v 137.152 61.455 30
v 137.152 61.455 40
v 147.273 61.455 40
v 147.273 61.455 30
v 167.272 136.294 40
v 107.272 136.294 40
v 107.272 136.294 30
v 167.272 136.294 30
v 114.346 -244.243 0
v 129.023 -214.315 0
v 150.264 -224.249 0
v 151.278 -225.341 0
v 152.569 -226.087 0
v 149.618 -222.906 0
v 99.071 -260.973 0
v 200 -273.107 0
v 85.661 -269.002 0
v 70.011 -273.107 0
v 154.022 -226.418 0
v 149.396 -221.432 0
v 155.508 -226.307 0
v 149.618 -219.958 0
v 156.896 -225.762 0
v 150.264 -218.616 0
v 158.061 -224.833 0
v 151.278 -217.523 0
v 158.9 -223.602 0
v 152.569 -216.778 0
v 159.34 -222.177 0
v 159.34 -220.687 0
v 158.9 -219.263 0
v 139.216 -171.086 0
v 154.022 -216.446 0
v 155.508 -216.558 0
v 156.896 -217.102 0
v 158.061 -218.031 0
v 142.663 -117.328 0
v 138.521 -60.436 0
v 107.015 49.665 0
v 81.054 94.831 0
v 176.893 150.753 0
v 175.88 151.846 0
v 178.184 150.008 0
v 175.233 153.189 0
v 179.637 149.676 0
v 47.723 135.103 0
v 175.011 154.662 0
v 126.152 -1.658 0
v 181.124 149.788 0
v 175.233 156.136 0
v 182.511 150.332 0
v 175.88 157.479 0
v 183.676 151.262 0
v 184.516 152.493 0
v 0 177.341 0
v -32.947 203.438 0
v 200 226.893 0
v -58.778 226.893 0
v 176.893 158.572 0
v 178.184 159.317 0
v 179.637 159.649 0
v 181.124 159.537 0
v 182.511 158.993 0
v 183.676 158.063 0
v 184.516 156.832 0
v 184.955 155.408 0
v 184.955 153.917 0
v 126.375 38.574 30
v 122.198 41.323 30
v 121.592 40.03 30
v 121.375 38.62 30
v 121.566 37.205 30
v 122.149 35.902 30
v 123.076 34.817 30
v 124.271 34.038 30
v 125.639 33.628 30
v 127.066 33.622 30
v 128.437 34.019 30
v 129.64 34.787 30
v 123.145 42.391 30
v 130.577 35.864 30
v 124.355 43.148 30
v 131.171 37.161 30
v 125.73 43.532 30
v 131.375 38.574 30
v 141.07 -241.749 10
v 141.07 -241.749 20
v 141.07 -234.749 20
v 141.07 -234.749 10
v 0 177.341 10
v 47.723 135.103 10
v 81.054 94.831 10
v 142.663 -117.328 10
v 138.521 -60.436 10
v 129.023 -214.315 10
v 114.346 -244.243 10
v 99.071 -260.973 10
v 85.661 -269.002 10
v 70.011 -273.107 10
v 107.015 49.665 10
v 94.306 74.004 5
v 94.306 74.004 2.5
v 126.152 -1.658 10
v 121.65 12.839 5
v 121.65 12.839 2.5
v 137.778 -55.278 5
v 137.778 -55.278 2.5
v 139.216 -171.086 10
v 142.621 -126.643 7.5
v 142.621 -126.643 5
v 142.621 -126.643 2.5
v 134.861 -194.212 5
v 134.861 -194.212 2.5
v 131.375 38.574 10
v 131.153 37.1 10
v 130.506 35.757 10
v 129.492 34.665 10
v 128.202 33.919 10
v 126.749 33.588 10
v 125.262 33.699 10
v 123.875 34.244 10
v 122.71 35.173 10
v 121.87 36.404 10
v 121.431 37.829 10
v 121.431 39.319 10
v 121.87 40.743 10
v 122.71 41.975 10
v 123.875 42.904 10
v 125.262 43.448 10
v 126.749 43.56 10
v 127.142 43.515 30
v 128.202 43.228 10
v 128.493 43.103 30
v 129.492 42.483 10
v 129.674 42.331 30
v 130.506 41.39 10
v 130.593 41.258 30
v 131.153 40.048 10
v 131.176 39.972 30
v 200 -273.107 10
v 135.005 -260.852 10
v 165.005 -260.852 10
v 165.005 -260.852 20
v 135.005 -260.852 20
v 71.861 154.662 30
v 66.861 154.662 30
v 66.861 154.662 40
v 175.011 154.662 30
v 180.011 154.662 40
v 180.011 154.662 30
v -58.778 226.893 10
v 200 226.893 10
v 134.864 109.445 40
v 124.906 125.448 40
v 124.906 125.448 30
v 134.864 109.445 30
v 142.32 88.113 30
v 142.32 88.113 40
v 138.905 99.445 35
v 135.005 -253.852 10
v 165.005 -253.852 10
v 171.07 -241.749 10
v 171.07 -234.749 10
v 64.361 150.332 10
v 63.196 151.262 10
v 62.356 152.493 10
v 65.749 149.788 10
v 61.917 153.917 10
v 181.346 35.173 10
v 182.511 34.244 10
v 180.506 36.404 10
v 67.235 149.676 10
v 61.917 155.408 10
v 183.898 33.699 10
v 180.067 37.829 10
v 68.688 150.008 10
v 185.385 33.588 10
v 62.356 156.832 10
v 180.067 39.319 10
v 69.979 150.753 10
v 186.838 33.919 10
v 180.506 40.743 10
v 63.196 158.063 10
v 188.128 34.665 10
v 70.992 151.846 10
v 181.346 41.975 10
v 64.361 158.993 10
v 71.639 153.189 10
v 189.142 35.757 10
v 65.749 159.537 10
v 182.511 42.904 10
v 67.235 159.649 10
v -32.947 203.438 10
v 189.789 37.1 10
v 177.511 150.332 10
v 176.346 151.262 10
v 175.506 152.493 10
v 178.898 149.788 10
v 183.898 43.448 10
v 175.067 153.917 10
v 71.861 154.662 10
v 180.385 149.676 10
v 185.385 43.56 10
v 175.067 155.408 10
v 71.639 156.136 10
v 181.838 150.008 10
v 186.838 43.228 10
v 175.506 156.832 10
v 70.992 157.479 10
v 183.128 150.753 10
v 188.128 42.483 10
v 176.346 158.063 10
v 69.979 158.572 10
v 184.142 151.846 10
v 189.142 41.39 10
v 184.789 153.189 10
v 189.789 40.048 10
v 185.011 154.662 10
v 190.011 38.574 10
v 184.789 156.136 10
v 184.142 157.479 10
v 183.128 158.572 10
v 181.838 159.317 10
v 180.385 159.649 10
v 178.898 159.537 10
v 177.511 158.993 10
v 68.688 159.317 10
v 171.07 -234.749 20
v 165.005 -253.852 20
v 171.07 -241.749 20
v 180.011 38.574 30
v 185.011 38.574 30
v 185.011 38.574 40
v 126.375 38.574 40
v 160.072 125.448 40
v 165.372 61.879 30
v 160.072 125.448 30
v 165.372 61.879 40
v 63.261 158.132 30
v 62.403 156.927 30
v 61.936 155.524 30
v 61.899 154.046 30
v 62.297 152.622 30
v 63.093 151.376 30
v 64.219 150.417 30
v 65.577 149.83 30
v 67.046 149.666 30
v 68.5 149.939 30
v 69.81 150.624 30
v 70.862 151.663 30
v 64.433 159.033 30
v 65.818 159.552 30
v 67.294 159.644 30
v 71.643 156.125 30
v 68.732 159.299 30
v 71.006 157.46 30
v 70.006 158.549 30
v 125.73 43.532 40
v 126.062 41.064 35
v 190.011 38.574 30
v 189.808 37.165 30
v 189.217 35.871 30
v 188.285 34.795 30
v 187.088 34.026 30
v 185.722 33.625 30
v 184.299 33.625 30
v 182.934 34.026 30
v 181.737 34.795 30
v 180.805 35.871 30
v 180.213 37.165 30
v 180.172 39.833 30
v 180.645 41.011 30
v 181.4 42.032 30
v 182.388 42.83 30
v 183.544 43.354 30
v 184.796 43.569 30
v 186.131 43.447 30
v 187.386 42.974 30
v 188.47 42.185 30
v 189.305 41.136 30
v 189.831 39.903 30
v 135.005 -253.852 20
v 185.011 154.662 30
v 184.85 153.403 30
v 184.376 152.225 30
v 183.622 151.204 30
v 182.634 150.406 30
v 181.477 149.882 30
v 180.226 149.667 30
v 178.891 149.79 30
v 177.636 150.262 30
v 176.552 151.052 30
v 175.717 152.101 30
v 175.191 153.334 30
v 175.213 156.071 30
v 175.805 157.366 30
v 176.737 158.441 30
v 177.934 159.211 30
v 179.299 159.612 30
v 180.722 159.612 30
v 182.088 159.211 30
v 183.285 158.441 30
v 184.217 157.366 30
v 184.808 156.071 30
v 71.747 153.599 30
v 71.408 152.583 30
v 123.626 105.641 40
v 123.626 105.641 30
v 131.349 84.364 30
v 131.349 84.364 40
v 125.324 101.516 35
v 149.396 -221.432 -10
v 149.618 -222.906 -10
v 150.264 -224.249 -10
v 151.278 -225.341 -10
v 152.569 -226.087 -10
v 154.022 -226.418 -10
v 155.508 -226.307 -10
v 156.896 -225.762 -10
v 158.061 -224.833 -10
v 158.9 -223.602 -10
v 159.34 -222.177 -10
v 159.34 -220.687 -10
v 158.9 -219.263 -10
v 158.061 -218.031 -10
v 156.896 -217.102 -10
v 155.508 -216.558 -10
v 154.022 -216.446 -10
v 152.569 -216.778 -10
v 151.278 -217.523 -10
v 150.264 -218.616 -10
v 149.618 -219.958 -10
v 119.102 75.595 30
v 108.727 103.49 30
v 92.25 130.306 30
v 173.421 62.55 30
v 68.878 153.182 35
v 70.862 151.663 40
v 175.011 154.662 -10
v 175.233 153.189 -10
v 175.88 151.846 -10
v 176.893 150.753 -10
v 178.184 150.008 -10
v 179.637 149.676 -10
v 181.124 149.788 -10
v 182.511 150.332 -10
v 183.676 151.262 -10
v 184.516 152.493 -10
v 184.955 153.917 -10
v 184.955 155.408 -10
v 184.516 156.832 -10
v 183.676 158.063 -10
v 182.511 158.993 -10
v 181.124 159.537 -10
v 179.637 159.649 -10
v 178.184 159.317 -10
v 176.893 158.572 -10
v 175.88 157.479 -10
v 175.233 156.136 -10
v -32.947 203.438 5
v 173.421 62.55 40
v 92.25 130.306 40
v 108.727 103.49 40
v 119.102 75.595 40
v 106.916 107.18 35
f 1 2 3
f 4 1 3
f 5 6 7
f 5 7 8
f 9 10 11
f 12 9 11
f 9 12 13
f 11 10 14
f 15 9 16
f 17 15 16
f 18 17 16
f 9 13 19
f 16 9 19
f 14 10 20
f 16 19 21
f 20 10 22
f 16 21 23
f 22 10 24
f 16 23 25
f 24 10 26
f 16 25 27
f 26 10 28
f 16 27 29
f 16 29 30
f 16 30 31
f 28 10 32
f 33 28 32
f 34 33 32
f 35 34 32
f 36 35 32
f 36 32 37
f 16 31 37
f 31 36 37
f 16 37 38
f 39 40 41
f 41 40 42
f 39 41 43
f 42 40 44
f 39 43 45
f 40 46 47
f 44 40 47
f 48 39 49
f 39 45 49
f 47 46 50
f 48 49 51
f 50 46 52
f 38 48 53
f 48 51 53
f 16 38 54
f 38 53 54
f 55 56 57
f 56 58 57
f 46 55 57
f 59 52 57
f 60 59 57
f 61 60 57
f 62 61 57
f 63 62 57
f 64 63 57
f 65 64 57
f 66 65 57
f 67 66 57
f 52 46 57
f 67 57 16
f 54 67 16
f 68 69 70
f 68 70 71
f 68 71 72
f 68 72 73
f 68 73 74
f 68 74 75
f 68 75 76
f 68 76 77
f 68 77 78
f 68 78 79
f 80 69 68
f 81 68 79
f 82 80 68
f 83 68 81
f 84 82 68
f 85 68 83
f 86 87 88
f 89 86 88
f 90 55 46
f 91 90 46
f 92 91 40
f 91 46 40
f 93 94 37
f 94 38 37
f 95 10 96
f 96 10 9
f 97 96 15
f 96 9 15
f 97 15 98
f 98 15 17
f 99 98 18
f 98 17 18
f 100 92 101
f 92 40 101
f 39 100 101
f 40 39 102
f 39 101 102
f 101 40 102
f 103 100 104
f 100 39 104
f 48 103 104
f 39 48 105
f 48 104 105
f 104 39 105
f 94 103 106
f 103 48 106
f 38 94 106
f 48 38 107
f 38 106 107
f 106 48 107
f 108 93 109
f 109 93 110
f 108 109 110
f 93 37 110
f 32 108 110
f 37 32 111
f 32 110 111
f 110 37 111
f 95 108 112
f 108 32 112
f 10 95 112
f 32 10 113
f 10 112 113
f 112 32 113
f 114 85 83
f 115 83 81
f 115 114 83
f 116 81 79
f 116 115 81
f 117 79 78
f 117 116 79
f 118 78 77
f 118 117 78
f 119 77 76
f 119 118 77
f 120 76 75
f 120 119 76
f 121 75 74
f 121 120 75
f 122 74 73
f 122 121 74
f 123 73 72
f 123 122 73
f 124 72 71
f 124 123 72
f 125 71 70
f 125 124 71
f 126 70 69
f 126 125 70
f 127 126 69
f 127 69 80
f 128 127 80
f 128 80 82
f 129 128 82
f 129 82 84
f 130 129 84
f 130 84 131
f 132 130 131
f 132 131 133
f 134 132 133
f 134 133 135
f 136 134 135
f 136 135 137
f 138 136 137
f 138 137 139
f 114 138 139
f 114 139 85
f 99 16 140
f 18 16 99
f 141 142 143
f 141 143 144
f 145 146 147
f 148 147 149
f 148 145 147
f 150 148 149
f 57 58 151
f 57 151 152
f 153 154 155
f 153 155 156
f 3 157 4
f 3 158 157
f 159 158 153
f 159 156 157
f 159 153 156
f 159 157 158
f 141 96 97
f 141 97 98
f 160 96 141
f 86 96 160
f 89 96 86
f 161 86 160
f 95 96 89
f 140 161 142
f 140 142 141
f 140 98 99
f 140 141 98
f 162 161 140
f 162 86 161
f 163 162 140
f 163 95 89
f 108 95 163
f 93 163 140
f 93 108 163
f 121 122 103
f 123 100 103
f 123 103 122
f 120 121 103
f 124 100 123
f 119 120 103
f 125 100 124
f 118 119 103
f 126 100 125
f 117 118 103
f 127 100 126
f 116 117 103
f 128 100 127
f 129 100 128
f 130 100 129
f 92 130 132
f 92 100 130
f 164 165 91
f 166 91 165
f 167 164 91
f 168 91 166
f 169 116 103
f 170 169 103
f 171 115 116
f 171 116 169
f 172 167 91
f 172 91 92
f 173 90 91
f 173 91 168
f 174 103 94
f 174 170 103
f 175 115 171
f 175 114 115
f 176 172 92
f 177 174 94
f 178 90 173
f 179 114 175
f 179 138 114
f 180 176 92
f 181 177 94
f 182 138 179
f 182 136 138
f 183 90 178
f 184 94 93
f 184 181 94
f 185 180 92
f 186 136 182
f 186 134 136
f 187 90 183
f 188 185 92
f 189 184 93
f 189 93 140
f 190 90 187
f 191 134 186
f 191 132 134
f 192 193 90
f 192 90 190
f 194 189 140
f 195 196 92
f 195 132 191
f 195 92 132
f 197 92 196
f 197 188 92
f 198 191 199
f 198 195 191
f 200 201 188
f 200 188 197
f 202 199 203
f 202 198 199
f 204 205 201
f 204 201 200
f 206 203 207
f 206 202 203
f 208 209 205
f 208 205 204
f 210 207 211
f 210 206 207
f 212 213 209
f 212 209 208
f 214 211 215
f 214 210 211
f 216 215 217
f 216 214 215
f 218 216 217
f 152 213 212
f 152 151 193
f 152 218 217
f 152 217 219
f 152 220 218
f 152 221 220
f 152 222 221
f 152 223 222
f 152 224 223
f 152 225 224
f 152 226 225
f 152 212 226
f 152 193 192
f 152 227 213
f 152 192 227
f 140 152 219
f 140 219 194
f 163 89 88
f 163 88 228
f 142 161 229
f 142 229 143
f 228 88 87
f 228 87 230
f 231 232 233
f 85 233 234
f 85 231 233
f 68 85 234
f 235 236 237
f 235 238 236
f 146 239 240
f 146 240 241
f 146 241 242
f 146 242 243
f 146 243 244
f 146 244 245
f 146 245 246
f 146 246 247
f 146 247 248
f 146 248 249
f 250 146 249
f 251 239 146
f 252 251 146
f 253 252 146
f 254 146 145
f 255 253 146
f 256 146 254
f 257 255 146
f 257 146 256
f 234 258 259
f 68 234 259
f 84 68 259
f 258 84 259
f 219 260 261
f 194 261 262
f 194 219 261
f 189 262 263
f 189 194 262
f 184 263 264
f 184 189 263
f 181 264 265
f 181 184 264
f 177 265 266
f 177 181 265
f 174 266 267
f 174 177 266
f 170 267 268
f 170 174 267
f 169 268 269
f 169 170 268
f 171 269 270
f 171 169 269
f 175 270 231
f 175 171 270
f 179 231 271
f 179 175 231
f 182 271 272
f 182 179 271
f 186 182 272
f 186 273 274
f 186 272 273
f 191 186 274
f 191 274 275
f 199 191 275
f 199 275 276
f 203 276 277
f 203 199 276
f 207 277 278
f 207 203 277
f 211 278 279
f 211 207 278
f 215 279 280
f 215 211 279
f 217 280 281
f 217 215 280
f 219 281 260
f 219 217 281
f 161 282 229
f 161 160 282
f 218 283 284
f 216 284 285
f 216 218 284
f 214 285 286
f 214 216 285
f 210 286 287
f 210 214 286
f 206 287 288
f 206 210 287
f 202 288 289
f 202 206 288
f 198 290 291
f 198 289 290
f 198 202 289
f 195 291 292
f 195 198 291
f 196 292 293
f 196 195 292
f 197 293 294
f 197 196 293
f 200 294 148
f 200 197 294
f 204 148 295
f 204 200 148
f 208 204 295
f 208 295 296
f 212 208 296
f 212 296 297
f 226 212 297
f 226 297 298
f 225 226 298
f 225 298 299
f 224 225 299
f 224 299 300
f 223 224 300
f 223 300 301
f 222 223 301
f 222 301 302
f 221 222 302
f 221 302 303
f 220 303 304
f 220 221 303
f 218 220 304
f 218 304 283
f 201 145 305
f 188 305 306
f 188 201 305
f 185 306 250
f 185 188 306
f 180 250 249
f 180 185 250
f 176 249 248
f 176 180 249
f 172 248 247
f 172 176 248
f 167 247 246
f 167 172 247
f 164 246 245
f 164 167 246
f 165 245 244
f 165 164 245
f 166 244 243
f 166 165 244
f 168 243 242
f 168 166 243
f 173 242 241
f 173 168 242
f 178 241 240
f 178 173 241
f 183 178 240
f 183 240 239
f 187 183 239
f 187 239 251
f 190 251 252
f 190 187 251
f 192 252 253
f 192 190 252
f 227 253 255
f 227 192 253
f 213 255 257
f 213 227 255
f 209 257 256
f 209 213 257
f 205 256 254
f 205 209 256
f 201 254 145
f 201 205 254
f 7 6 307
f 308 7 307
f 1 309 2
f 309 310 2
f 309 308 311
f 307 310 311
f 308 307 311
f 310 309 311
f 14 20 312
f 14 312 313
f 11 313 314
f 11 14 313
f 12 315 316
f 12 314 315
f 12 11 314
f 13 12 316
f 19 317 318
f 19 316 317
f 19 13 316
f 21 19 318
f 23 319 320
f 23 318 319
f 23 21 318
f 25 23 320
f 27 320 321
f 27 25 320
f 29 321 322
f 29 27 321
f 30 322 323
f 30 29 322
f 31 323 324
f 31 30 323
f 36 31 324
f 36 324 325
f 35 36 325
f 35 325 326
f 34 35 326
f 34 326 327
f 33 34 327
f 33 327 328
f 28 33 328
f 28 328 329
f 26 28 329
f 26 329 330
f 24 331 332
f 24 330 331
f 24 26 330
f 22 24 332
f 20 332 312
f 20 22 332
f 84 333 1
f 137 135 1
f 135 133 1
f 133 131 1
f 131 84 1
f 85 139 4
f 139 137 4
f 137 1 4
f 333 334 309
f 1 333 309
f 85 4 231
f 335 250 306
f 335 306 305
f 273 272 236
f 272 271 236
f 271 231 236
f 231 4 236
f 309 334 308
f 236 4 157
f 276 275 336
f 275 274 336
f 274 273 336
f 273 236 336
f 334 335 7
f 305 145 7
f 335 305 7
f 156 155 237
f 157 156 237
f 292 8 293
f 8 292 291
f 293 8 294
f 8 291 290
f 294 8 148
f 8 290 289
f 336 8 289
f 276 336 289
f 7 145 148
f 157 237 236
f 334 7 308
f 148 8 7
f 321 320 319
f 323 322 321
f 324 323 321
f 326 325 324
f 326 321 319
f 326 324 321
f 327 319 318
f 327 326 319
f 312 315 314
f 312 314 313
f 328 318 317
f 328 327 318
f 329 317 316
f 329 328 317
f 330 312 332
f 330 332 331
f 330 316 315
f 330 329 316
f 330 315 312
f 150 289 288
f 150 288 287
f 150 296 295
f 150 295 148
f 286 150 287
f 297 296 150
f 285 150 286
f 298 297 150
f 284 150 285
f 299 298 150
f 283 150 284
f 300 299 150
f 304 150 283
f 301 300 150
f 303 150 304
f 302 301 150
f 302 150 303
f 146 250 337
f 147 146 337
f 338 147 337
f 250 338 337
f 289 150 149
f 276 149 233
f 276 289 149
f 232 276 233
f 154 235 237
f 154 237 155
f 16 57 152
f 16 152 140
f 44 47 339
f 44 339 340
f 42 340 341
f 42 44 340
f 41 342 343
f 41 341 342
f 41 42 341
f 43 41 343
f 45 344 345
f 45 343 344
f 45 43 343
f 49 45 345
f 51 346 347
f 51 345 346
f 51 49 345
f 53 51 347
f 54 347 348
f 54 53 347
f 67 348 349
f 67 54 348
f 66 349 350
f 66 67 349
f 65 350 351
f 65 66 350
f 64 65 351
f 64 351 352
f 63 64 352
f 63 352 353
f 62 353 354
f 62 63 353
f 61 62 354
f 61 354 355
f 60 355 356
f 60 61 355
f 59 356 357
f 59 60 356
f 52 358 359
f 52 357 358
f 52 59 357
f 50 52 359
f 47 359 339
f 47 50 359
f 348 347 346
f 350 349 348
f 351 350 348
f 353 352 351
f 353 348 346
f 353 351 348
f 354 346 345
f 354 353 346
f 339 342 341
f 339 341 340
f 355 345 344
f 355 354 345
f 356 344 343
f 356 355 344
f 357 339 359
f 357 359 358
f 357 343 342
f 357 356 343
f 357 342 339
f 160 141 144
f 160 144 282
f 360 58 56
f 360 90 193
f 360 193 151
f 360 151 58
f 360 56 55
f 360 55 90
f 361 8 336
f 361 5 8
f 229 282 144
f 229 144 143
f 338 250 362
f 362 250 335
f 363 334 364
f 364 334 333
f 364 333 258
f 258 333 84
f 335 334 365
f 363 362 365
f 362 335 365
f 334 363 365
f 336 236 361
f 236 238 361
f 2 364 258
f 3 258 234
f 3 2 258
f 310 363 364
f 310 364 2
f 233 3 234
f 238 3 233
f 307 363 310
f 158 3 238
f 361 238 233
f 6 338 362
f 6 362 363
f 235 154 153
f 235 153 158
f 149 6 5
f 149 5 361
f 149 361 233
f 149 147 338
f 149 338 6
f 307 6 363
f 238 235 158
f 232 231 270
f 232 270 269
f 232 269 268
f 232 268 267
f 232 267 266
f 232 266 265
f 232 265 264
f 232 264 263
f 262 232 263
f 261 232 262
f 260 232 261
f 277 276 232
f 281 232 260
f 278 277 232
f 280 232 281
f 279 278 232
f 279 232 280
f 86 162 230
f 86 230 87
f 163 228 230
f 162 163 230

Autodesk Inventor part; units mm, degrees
ref_plane "YZ Plane" through (0, 0, 0) normal (1, 0, 0) x (0, 1, 0)
ref_plane "XZ Plane" through (0, 0, 0) normal (0, 1, 0) x (-1, 0, 0)
ref_plane "XY Plane" through (0, 0, 0) normal (0, 0, 1) x (1, 0, 0)
sketch "Sketch1" plane through (0, 0, 0) normal (0, 0, 1) x (1, 0, 0)
  line L0 (0, 226.8926) -> (200, 226.8926)
  line L1 (200, 226.8926) -> (200, -273.1074)
  line L2 (200, -273.1074) -> (70.0106, -273.1074)
  spline S0 degree 4 poles (0, 177.3413) (126.203, 79.0594) (154.2664, -10.2822) (176.0066, -260.8084) (70.0106, -273.1074) knots 0 0 0 0 0 1 1 1 1 1
  spline S1 degree 2 poles (0, 177.3413) (-36.5043, 204.7595) (-58.7785, 226.8926) knots 0 0 0 1 1 1
  line L3 (-58.7785, 226.8926) -> (0, 226.8926)
  point P0 (0, 0)
  point P1 (99.9997, 63.7426)
  point P2 (140.6791, -78.917)
  point P3 (126.8096, -220.2554)
  point P4 (-35.664, 205.7436)
extrude "Extrusion1" add sketch "Sketch1" along normal blind 10
sketch "Sketch2" plane through (0, 0, 10) normal (0, 0, 1) x (1, 0, 0)
  circle A0 centre (66.8612, 154.6625) radius 5
  circle A1 centre (180.0109, 154.6625) radius 5
  circle A2 centre (185.0109, 38.5738) radius 5
  circle A3 centre (126.375, 38.5738) radius 5
  point P0 (0, 0)
  dimension "d5" = 10
  dimension "d6" = 10
  dimension "d7" = 10
  dimension "d8" = 10
extrude "Extrusion2" add sketch "Sketch2" along normal blind 20
sketch "Sketch3" plane through (180.0109, 154.6625, 30) normal (0, 0, 1) x (1, 0, 0)
  circle A0 centre (-113.1497, 0) radius 5 projected
  circle A1 centre (0, 0) radius 5 projected
  line L0 (-113.1497, 0) -> (0, 0)
  circle A2 centre (5, -116.0887) radius 5 projected
  line L1 (0, 0) -> (5, -116.0887)
  circle A3 centre (-53.6359, -116.0887) radius 5 projected
  line L2 (5, -116.0887) -> (-53.6359, -116.0887)
  spline S0 degree 2 poles (-113.1497, 0) (-63.3738, -35.791) (-53.6359, -116.0887) knots 0 0 0 1 1 1
  point P0 (-180.0109, -154.6625)
  point P1 (-75.6781, -42.6148)
extrude "Extrusion3" add sketch "Sketch3" along normal blind 10 contours L0 A1 L1 A2 L2 A3 S0 A0 | A0 S0 L0 | L0 L1 A1 | A3 L2 S0 | L1 L2 A2 picked at (-110.3004, -1.6927) picked at (-1.6834, -2.8514) picked at (-53.6623, -112.78) picked at (1.7062, -115.7278)
sketch "Sketch4" plane through (180.0109, 154.6625, 40) normal (0, 0, 1) x (1, 0, 0)
  line L0 (-72.7391, -18.3685) -> (-12.7391, -18.3685)
  line L1 (-12.7391, -18.3685) -> (-6.5901, -92.1125)
  spline S0 degree 2 poles (-72.7391, -18.3685) (-51.5746, -50.5042) (-42.859, -93.2077) knots 0 0 0 1 1 1
  line L2 (-14.6388, -92.7837) -> (-19.9394, -29.2142)
  line L3 (-19.9394, -29.2142) -> (-55.1054, -29.2142)
  spline S1 degree 2 poles (-55.1054, -29.2142) (-38.2895, -49.2242) (-32.7381, -93.2077) knots 0 0 0 1 1 1
  line L4 (-42.859, -93.2077) -> (-32.7381, -93.2077)
  line L5 (-14.6388, -92.7837) -> (-6.5901, -92.1125)
  point P0 (-180.0109, -154.6625)
  point P1 (-55.1635, -51.9626)
  point P2 (-42.687, -50.9557)
  dimension "d13" = 60
  dimension "d14" = 74
extrude "Extrusion4" cut sketch "Sketch4" against normal blind 10
sketch "Sketch6" plane through (0, 0, 10) normal (0, 0, 1) x (1, 0, 0)
  line L0 (135.0053, -253.8522) -> (165.0053, -253.8522)
  line L1 (165.0053, -253.8522) -> (165.0053, -260.8522)
  line L2 (165.0053, -260.8522) -> (135.0053, -260.8522)
  line L3 (135.0053, -260.8522) -> (135.0053, -253.8522)
  line L4 (141.0698, -234.749) -> (171.0698, -234.749)
  line L5 (171.0698, -234.749) -> (171.0698, -241.749)
  line L6 (171.0698, -241.749) -> (141.0698, -241.749)
  line L7 (141.0698, -241.749) -> (141.0698, -234.749)
  point P0 (0, 0)
  dimension "d22" = 30
  dimension "d23" = 7
  dimension "d24" = 30
  dimension "d25" = 7
extrude "Extrusion6" add sketch "Sketch6" along normal blind 10
sketch "Sketch8" plane through (0, 0, 0) normal (0, 0, -1) x (-1, 0, 0)
  circle A0 centre (-180.0109, 154.6625) radius 5 projected
  circle A1 centre (-180.0109, 154.6625) radius 5
  line L0 (-180.0109, 154.6625) -> (-154.3956, -221.4322) construction
  circle A2 centre (-154.3956, -221.4322) radius 5
  point P0 (0, 0)
  dimension "d32" = 10
  dimension "d33" = 376.966
  dimension "d34" = 10
extrude "Extrusion8" add sketch "Sketch8" along normal blind 10
properties part number "Part2 new side frame" material "CFRP"
